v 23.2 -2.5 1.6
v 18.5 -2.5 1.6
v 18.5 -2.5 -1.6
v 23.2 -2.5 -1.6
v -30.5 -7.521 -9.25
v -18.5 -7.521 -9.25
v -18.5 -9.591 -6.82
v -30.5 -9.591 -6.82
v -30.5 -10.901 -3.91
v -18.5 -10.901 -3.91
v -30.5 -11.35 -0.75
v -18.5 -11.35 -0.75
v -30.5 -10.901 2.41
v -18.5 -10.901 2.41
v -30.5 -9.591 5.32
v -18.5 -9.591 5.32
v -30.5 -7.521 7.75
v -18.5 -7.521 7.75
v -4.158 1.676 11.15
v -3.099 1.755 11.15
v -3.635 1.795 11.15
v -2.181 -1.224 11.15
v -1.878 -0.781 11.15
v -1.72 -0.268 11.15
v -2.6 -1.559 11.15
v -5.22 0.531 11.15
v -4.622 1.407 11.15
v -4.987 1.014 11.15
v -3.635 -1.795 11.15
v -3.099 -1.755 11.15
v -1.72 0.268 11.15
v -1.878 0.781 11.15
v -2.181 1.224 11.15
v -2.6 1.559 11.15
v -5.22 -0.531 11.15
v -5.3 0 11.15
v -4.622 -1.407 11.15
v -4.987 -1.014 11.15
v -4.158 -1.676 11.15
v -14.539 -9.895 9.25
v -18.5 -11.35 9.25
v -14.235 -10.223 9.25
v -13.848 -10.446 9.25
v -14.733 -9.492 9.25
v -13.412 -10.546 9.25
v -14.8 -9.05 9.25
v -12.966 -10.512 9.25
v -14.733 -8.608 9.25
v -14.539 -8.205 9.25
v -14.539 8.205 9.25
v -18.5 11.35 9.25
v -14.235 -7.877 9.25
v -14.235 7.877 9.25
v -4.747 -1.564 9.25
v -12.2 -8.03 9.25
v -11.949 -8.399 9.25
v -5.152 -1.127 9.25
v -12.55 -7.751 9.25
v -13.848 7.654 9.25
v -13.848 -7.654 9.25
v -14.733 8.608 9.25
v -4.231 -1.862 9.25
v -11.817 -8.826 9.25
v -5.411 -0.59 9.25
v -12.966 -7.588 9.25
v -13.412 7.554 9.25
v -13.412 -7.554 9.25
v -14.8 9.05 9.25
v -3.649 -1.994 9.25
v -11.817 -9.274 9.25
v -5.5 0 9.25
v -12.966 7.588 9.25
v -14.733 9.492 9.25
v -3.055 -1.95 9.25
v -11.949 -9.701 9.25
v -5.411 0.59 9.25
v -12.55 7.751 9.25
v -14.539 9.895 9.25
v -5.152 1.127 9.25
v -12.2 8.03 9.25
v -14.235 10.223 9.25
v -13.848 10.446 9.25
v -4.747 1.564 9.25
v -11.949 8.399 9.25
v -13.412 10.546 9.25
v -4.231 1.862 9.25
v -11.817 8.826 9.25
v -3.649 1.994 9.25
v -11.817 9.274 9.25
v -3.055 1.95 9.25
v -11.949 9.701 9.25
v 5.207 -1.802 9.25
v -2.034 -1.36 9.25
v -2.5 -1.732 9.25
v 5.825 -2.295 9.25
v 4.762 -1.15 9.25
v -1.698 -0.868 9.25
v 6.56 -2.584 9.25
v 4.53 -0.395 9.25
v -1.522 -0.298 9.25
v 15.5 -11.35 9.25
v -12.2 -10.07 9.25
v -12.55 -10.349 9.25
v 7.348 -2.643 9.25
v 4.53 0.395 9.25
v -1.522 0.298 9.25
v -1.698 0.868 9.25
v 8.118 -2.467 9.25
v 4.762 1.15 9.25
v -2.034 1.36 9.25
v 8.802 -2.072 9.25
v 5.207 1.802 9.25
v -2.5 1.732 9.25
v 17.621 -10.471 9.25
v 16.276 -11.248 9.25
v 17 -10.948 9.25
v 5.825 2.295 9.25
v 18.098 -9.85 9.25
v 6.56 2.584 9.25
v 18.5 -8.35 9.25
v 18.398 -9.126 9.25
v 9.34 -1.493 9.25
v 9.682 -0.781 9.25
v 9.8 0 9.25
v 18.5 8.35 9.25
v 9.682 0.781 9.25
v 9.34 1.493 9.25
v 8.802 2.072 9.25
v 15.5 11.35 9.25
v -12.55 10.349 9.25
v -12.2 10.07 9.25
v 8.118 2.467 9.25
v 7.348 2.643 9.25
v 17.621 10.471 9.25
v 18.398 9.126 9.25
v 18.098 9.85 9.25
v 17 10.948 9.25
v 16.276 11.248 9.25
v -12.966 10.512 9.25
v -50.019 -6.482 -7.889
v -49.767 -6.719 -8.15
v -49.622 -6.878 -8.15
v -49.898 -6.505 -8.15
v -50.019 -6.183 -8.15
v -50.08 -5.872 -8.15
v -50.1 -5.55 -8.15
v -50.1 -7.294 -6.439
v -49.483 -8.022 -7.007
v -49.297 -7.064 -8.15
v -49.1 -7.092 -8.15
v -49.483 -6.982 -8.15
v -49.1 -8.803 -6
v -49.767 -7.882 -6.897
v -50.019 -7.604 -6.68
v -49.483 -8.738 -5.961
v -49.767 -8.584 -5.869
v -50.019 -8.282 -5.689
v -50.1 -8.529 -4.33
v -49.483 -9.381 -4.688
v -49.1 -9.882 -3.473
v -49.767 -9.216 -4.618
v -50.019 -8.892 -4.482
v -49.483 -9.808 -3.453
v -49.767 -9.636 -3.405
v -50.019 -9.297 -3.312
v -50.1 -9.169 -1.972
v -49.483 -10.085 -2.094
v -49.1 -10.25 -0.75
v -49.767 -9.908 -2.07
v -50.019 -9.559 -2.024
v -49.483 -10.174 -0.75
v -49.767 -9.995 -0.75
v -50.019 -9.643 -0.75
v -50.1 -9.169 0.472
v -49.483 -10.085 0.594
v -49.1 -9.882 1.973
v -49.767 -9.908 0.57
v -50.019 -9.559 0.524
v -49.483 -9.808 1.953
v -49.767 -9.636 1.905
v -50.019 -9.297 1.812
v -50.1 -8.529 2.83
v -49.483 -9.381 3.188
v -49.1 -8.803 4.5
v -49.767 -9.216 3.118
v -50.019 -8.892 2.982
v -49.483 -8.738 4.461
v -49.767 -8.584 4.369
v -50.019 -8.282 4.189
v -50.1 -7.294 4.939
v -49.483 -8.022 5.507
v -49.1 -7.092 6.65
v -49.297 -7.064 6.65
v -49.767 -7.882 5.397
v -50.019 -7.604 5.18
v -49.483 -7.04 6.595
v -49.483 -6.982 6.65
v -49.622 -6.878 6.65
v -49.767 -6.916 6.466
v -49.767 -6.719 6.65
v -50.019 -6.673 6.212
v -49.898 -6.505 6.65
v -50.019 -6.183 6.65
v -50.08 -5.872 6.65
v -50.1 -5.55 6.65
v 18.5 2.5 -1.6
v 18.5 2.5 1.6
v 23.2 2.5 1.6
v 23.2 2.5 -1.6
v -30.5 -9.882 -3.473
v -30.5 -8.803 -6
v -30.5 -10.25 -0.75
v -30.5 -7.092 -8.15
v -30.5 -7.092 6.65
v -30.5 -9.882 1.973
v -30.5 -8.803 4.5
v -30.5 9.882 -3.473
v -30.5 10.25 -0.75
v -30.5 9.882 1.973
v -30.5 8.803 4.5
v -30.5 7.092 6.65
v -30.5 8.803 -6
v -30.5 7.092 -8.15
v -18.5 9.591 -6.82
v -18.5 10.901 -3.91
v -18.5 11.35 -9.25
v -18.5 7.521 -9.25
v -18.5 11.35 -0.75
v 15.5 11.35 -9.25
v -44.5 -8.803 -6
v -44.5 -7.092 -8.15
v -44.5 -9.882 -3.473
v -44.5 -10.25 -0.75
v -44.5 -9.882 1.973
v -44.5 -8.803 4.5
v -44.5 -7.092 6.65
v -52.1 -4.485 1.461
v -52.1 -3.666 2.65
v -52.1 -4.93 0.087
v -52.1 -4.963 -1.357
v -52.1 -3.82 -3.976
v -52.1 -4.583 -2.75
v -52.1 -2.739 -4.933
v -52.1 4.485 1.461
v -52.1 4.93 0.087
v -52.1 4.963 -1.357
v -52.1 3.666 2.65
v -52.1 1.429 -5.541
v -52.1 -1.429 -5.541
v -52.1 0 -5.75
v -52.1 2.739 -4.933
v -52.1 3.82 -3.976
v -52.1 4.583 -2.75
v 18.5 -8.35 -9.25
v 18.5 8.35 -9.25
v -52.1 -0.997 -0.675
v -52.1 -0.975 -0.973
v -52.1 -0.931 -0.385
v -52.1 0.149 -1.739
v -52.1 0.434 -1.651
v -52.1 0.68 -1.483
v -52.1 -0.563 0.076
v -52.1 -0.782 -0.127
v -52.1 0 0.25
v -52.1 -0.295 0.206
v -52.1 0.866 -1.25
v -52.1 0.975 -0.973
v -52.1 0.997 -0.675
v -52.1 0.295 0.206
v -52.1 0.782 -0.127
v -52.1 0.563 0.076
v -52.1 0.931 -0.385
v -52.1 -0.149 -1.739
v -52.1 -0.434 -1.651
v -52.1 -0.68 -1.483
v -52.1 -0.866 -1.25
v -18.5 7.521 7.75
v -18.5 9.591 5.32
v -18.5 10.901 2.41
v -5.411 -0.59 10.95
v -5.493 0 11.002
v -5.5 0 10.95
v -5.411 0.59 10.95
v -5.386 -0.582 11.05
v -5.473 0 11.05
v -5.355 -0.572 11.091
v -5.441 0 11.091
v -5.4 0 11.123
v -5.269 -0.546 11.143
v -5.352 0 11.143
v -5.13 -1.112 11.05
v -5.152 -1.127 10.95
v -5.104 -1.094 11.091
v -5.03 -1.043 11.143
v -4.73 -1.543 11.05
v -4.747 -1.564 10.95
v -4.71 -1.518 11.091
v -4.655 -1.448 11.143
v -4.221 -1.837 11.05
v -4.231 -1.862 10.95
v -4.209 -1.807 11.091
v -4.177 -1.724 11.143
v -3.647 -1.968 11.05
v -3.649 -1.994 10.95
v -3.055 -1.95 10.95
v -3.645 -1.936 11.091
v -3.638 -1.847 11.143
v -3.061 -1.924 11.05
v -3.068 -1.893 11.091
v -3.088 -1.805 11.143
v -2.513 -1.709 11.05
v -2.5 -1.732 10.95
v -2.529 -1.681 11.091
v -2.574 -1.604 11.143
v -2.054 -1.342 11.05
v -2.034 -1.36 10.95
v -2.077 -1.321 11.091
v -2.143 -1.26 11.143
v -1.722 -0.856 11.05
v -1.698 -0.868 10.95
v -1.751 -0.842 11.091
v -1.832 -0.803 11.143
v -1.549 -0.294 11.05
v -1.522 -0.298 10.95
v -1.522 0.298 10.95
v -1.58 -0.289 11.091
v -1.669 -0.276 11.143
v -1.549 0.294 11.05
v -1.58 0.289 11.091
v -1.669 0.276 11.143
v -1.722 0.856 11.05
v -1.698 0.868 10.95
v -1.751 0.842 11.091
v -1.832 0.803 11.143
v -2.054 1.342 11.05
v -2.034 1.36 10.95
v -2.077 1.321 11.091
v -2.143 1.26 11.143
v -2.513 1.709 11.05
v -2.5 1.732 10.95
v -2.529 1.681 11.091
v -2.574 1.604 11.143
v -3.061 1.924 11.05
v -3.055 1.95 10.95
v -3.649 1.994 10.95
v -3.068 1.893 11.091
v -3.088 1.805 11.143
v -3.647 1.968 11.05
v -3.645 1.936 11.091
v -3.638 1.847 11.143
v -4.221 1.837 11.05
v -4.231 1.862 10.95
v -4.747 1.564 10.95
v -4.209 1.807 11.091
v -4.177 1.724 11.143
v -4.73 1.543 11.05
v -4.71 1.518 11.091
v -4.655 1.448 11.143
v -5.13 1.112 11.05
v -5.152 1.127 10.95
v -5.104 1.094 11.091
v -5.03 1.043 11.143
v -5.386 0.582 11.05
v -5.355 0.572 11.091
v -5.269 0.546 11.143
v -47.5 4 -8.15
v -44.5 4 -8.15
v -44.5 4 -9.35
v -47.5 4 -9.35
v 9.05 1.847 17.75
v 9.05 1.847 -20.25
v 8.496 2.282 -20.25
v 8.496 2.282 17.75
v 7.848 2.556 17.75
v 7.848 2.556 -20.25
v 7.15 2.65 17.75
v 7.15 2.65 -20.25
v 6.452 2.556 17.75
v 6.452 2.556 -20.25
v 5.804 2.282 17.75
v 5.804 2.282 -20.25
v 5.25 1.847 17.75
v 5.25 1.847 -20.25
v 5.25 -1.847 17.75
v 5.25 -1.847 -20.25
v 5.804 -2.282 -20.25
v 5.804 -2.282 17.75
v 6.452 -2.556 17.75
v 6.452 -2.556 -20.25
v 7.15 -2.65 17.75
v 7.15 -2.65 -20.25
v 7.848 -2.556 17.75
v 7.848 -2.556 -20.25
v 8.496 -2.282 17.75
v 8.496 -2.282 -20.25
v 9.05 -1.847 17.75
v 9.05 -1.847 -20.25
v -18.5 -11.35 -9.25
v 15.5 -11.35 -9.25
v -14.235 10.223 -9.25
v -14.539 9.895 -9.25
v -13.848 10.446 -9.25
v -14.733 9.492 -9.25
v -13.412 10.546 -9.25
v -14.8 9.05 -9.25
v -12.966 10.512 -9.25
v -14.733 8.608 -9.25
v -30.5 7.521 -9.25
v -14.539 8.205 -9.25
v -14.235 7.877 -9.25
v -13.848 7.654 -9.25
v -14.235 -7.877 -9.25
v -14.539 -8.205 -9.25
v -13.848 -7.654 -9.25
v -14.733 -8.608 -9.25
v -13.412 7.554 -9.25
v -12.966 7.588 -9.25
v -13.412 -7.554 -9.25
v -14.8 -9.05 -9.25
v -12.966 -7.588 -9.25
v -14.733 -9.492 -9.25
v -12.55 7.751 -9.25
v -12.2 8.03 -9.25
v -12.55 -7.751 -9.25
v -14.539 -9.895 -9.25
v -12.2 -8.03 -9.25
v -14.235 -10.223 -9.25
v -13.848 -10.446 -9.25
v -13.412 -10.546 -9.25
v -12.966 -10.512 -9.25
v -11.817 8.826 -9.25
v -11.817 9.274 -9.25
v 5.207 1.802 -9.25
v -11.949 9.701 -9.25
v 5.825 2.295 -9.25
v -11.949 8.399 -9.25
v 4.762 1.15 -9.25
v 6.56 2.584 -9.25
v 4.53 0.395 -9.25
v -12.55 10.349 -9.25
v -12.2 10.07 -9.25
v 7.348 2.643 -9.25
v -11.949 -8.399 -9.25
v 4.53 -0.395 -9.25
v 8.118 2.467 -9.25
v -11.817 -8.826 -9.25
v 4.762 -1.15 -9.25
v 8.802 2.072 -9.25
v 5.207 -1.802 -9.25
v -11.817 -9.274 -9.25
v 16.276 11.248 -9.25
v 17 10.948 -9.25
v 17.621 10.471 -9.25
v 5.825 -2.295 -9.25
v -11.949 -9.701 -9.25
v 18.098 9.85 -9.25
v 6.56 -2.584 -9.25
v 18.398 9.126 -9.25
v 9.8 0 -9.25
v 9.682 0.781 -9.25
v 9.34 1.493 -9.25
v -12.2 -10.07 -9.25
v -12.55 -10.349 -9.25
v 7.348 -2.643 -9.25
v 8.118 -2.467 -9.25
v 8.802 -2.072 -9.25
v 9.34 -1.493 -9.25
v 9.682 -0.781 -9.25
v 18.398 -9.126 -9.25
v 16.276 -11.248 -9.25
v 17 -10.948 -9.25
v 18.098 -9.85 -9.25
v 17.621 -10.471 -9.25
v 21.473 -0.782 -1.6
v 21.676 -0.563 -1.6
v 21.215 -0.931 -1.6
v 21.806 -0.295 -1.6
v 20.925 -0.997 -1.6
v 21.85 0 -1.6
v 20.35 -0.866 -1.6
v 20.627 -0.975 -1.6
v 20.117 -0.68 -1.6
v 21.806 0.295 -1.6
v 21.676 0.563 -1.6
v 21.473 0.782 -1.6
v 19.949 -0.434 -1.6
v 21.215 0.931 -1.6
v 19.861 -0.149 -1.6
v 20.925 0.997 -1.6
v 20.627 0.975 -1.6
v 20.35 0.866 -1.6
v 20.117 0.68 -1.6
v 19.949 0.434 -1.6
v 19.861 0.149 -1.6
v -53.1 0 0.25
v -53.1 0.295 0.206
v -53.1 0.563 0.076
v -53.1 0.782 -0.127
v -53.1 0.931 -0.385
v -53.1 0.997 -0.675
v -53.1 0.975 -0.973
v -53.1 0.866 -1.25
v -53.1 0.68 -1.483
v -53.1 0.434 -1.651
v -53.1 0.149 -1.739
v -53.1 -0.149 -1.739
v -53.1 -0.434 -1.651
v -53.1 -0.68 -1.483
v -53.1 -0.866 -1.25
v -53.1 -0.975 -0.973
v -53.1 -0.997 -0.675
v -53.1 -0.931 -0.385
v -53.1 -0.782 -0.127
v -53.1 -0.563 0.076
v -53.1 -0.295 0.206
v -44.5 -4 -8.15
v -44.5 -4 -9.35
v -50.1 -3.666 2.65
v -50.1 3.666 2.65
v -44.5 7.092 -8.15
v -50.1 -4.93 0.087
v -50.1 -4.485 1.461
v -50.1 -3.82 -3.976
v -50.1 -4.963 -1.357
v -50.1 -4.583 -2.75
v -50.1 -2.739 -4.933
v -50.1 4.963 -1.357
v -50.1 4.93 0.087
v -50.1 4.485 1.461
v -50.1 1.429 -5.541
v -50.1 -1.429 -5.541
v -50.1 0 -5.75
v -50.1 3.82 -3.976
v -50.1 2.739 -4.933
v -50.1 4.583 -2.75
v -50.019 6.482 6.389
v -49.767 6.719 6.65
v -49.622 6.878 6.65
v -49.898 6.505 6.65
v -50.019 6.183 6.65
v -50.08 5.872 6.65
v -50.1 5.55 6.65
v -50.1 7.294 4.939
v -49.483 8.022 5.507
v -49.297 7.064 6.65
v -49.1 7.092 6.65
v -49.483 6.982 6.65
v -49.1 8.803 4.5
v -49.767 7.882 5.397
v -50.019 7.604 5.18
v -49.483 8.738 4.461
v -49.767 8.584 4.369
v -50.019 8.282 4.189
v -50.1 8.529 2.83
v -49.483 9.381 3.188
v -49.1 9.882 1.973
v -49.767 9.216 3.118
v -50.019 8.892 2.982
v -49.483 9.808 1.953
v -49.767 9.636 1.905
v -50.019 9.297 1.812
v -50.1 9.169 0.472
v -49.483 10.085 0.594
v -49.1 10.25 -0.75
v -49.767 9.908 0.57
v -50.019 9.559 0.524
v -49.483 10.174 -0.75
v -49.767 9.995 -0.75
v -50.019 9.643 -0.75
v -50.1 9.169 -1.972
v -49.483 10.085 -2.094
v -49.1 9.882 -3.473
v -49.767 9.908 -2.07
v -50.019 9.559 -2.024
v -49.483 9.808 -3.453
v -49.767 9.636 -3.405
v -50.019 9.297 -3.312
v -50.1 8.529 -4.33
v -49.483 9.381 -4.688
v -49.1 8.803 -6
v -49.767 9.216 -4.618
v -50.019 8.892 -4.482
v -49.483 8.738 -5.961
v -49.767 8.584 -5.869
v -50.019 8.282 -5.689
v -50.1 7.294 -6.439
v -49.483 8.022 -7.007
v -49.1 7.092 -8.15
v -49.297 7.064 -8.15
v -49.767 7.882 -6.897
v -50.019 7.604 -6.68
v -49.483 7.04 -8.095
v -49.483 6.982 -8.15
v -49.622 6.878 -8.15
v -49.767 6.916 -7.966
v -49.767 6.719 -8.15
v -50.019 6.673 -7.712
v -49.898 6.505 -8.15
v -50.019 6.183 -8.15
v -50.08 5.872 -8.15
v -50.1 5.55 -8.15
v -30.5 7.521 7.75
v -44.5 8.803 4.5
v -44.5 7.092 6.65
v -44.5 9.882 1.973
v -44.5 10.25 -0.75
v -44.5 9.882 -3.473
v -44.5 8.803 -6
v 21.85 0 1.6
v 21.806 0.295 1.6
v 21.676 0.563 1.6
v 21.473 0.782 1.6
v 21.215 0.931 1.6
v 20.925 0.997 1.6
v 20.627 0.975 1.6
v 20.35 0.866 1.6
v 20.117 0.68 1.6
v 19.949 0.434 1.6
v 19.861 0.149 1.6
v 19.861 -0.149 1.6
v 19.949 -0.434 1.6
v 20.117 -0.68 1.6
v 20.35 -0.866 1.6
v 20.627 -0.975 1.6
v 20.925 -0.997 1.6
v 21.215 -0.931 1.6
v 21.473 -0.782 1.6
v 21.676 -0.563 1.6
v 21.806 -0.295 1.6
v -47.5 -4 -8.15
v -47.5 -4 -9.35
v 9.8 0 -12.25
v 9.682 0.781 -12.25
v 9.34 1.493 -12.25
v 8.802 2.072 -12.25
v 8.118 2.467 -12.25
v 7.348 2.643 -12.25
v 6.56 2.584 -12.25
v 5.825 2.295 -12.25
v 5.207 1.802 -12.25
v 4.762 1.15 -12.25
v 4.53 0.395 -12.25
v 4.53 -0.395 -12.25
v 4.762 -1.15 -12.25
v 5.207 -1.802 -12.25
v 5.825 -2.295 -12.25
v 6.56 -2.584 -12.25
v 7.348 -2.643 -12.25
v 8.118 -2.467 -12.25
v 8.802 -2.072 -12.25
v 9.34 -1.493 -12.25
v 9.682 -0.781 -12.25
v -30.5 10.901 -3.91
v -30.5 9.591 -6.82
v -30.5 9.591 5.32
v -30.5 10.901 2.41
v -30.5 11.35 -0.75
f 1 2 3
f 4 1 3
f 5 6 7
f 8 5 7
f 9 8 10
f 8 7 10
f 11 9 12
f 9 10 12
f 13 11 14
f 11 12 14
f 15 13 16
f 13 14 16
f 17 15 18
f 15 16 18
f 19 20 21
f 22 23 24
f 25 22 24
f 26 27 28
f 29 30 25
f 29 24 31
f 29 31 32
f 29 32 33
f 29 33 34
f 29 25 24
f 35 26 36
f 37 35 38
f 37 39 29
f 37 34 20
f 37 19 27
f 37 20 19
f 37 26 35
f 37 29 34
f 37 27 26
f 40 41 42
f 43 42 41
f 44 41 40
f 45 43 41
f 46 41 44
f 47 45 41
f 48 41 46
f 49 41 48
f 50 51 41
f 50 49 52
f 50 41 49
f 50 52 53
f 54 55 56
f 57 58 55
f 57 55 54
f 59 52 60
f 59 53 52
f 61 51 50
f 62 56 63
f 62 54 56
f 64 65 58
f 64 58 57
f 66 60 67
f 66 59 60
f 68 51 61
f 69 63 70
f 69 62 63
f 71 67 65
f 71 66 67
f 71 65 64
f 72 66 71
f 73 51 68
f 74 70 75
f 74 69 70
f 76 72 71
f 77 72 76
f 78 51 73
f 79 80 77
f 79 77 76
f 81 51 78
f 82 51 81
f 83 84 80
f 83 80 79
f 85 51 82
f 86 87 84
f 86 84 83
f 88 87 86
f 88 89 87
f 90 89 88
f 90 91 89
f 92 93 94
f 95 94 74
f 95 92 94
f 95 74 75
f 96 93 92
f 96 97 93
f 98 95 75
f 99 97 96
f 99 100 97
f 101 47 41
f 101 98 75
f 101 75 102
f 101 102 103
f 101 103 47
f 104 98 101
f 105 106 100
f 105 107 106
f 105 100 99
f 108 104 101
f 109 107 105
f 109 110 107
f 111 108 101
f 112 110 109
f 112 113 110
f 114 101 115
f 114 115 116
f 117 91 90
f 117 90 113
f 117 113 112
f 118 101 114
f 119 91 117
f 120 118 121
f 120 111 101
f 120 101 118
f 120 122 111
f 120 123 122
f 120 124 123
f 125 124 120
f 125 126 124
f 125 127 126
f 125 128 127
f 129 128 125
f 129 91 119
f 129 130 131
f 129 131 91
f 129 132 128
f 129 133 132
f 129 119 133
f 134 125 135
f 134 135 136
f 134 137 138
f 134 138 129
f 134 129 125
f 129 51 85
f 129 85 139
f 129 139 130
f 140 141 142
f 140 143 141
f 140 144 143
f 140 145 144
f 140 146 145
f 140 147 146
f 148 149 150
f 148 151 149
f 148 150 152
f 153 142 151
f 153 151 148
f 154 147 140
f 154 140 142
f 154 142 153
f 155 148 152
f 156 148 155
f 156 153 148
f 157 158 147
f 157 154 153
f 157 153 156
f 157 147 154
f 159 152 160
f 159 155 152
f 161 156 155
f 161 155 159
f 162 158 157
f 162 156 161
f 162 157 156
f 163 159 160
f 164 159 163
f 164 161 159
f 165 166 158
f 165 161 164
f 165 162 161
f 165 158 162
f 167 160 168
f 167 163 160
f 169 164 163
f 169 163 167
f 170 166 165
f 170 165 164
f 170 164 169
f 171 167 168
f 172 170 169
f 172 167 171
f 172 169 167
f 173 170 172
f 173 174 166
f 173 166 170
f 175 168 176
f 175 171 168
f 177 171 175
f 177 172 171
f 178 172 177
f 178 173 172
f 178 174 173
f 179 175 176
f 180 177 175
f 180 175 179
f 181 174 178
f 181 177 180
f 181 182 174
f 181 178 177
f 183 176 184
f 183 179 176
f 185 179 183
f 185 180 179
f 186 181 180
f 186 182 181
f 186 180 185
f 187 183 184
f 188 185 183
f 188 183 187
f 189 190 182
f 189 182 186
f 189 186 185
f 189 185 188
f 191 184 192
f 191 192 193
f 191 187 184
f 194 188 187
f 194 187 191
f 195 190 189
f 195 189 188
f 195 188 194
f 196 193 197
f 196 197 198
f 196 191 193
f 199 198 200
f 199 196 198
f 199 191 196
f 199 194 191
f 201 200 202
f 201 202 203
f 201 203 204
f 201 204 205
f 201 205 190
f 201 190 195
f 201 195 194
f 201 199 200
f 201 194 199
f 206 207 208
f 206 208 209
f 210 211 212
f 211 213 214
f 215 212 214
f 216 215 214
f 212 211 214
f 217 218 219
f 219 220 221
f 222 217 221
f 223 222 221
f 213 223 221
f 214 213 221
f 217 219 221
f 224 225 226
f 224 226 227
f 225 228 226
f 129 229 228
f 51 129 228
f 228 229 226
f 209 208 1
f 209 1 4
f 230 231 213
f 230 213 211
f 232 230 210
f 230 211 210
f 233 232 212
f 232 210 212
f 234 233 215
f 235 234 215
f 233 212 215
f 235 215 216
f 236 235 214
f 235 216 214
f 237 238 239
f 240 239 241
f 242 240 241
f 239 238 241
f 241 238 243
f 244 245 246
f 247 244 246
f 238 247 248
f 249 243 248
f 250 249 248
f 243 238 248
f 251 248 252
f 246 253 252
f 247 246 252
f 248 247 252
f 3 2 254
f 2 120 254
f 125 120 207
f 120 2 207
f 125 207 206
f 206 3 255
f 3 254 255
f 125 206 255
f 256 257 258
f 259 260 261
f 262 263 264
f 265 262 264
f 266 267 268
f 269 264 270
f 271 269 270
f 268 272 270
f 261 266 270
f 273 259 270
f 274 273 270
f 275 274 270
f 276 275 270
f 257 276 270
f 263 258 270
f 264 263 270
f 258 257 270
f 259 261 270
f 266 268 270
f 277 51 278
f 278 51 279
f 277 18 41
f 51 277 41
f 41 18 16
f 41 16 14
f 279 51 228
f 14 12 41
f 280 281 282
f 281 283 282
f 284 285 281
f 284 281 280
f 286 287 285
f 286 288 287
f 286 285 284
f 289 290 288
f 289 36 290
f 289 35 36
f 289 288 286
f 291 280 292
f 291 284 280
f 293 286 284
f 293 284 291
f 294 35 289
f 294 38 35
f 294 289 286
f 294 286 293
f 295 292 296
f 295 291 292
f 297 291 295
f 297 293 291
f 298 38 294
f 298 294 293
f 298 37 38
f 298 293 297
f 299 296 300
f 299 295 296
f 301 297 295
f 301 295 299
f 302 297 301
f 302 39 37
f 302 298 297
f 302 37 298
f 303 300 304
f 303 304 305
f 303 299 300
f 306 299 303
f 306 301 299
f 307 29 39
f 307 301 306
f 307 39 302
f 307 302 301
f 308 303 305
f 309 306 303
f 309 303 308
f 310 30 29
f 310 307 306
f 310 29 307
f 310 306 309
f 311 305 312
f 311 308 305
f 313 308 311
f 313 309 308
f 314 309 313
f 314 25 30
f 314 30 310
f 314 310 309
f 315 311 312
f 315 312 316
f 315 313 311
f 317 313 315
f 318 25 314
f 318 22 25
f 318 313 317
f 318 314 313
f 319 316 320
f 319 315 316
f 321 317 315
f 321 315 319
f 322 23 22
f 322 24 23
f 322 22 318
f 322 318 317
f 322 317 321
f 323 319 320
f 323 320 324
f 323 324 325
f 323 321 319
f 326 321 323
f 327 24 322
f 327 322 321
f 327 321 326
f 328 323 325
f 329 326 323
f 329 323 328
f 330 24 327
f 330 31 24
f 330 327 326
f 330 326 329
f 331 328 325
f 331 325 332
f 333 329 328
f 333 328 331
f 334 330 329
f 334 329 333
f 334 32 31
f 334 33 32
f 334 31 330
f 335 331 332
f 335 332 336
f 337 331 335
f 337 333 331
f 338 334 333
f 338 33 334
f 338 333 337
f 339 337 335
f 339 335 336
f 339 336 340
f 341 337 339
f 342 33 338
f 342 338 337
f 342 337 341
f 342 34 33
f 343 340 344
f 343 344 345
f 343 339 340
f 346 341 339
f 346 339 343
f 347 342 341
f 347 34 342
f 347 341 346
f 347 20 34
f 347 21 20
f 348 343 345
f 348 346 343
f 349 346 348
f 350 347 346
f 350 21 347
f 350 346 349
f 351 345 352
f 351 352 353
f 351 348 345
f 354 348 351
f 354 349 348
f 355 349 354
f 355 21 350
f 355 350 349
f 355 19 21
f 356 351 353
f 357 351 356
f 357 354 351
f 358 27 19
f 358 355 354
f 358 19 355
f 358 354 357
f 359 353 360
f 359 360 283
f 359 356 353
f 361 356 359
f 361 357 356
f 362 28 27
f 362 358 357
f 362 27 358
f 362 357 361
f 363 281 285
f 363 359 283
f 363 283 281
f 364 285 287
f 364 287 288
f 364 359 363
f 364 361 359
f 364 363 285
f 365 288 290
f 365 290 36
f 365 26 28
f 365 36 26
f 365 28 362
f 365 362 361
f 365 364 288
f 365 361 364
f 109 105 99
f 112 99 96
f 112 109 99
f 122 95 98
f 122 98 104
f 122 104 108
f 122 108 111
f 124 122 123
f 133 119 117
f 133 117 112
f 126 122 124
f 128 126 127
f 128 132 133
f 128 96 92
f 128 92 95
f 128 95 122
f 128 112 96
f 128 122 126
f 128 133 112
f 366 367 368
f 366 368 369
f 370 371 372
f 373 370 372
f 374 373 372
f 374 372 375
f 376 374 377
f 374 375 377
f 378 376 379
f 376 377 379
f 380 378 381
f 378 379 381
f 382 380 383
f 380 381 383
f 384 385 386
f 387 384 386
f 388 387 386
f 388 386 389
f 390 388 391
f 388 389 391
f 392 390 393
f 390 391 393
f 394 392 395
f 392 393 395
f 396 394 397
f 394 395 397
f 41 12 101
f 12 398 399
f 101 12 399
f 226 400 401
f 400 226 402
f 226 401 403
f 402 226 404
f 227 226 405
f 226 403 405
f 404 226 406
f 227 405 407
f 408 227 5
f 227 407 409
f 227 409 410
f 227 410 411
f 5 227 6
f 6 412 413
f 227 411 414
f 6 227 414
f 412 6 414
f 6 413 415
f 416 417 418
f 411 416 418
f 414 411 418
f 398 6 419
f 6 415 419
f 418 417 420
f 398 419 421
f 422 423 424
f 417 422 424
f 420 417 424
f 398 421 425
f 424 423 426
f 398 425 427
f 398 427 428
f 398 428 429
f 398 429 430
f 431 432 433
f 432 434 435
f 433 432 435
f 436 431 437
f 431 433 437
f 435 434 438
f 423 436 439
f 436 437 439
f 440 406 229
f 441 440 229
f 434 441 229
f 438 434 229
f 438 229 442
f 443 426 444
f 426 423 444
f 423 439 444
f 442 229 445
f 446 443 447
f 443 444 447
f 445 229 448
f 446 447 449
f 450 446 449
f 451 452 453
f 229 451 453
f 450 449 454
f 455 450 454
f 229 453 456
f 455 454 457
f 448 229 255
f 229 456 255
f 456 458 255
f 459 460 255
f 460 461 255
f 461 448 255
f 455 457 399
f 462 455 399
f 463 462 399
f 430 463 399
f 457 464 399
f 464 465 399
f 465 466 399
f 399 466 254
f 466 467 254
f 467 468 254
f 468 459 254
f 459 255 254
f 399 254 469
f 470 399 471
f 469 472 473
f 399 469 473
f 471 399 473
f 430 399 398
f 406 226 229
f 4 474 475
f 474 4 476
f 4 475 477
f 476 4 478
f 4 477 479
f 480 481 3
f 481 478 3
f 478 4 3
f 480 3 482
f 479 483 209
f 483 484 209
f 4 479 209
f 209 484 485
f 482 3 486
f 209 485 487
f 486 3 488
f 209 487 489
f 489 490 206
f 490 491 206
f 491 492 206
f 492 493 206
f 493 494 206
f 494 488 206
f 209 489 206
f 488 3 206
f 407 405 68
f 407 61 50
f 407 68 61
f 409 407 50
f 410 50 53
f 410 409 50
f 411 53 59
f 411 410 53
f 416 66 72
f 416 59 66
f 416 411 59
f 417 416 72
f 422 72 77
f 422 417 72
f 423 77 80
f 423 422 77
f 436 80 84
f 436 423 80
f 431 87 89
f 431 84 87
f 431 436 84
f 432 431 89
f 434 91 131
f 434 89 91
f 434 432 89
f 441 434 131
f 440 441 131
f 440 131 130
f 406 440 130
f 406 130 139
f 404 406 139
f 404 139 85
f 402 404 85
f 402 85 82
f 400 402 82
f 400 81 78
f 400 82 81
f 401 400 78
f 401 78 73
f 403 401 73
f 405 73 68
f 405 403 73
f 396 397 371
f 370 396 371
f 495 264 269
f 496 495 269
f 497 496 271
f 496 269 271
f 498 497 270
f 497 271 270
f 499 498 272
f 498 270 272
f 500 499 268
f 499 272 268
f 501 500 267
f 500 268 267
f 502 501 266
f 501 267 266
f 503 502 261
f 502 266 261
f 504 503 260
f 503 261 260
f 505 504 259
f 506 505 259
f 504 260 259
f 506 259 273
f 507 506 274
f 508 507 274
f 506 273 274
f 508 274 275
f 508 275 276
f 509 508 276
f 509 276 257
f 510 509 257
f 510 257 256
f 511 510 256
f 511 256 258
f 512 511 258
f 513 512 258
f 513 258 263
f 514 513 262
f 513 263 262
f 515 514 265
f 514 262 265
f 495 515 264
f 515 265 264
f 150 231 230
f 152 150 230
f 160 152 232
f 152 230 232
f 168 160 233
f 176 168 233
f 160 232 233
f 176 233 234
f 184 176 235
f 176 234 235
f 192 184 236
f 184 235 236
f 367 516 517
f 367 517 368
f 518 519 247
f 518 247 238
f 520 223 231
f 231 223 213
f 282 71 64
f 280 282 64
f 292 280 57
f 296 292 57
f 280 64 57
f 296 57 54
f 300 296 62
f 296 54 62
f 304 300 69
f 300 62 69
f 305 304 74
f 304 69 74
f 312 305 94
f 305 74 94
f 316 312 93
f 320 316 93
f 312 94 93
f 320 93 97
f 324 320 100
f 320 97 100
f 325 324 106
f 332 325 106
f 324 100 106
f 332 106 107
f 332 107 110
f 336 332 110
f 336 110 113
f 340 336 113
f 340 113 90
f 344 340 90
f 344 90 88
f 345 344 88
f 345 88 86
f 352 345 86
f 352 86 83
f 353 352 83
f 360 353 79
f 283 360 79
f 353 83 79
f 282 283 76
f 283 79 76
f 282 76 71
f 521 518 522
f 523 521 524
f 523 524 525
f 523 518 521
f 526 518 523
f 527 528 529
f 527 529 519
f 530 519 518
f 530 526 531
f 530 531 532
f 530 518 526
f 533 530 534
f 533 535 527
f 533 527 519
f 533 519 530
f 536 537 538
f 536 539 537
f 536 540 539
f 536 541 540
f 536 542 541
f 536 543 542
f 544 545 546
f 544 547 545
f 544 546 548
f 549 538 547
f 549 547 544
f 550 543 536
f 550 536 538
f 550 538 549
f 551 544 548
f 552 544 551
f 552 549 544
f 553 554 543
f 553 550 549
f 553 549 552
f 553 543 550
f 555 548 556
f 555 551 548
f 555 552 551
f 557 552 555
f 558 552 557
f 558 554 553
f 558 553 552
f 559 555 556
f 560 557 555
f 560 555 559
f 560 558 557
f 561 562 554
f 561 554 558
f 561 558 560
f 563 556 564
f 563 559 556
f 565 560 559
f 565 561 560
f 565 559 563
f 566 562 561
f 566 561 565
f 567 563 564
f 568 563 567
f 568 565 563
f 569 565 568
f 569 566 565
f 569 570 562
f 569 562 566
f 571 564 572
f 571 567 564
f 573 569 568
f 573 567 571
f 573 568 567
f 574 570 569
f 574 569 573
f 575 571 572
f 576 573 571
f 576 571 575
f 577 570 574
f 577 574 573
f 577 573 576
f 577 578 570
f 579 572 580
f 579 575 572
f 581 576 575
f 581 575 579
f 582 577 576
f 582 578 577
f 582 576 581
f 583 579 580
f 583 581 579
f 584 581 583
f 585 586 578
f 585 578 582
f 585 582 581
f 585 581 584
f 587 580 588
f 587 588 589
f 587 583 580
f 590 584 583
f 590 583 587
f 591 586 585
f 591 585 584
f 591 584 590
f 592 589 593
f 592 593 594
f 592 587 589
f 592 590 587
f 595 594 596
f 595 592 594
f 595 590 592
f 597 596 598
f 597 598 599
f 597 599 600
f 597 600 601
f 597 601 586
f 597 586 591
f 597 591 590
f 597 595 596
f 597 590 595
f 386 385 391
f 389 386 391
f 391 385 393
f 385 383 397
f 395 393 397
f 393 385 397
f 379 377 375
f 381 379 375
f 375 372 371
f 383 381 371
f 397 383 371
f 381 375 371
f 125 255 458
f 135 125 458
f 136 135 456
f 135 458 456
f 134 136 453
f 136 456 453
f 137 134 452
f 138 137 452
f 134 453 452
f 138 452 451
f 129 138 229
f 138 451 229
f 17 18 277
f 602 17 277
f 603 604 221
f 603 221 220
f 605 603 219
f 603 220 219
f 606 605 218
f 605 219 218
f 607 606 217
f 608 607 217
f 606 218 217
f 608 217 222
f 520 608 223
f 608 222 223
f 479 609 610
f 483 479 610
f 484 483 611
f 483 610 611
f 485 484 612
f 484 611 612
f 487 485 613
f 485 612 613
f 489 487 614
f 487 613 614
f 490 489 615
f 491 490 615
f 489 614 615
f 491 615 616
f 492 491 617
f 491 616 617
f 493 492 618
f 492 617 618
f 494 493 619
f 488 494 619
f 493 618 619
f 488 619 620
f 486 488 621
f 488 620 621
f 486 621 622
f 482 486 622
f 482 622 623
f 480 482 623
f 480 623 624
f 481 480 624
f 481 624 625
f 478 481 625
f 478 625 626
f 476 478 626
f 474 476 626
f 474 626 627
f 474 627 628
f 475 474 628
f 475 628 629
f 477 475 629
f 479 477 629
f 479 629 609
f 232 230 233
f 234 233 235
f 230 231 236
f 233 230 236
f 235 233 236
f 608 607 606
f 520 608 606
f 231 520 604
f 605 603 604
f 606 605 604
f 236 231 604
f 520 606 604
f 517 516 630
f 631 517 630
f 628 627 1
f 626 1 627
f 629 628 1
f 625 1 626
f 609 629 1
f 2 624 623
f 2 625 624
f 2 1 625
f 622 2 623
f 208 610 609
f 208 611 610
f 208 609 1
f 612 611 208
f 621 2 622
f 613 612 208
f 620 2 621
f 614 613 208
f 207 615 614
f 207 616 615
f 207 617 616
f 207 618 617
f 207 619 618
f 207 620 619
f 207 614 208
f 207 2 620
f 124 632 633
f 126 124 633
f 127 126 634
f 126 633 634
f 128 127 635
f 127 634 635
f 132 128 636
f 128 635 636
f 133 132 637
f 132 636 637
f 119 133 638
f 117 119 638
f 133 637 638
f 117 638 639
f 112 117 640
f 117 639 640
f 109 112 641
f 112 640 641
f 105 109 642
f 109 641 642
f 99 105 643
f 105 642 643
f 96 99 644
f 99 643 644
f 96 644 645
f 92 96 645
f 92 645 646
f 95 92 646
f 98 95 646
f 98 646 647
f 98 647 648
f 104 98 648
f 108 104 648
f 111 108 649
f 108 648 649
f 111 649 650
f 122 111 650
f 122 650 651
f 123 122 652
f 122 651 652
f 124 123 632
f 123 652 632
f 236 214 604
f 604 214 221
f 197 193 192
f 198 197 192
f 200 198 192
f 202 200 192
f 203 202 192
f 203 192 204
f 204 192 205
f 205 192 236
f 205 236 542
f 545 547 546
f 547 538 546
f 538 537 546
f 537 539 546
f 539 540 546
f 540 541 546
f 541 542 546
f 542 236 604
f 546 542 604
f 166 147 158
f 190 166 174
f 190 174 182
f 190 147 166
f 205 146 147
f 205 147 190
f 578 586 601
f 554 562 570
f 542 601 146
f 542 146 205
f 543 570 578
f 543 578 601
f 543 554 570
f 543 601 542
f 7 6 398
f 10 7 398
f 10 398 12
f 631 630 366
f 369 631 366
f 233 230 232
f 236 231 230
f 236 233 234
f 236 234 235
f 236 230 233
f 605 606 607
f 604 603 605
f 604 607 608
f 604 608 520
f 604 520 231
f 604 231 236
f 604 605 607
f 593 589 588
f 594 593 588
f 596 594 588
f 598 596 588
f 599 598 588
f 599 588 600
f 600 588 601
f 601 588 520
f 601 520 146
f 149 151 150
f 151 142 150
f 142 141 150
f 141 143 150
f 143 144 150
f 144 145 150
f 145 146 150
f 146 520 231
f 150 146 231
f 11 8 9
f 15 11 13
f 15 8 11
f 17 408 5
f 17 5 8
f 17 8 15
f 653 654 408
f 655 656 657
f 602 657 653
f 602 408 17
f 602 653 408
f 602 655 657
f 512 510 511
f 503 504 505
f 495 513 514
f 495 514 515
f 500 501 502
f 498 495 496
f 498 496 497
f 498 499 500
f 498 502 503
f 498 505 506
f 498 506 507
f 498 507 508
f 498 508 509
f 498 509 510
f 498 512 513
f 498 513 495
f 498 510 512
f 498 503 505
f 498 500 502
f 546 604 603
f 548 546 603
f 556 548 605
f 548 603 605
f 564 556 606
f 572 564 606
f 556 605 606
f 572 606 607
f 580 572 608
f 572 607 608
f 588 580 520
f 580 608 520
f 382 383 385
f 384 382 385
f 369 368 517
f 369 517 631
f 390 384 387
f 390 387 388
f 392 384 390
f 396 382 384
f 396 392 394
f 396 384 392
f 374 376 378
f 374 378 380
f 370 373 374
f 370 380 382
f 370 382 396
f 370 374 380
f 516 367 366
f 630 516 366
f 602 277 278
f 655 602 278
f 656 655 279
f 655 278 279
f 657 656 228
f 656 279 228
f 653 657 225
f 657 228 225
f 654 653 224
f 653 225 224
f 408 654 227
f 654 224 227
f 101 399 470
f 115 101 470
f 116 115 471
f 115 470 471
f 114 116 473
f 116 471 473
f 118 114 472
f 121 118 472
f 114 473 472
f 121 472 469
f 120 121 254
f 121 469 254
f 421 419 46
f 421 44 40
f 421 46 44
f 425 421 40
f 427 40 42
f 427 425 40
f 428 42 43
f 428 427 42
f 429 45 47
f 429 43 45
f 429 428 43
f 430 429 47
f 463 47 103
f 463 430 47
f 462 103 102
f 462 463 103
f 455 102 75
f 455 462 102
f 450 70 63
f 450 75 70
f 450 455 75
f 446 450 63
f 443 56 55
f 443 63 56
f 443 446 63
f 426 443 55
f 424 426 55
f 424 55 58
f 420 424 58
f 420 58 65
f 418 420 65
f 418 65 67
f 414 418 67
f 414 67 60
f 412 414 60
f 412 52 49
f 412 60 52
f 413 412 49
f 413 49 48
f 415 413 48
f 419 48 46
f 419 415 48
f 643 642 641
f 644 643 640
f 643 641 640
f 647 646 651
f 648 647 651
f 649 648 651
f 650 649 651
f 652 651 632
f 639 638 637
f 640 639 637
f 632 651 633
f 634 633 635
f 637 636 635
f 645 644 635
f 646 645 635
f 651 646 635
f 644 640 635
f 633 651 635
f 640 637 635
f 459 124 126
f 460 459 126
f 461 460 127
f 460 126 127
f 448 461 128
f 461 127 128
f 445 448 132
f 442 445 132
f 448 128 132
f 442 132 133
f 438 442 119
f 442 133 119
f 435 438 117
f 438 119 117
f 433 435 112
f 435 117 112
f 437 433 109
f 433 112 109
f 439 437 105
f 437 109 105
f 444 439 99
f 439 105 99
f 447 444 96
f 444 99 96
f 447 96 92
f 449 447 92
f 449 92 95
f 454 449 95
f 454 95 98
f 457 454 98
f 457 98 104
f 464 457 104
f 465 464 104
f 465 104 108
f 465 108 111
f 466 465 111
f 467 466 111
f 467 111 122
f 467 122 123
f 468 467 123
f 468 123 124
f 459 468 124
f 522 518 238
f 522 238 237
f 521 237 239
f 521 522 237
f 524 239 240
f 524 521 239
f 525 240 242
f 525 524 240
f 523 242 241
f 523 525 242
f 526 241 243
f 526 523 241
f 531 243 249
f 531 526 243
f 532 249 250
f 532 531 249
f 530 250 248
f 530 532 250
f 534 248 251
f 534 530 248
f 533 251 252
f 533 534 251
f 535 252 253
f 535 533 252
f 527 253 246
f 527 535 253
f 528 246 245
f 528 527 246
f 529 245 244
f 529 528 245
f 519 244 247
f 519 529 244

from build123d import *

# Parameters (mm, degrees)
SALIENTE_EXTRUIR1_DEPTH       = 9.25
SALIENTE_EXTRUIR1_DEPTH_BACK  = 9.25
SALIENTE_EXTRUIR2_DEPTH       = 12
CROQUIS3_W                    = 3.2
CROQUIS3_H                    = 5
SALIENTE_EXTRUIR3_DEPTH       = 4.7
CORTAR_EXTRUIR1_DEPTH         = 28
CORTAR_EXTRUIR1_DEPTH_BACK    = 17.7
CROQUIS4_R                    = 1.5
CROQUIS5_R                    = 2
SALIENTE_EXTRUIR4_DEPTH       = 1.9
REDONDEO1_R                   = 0.2
CROQUIS6_R                    = 2.65
CORTAR_EXTRUIR2_DEPTH         = 23.9
SALIENTE_EXTRUIR5_DEPTH       = 14
SALIENTE_EXTRUIR6_DEPTH       = 5.6
REDONDEO2_R                   = 1
SALIENTE_EXTRUIR7_DEPTH       = 2
CROQUIS12_R                   = 1
SALIENTE_EXTRUIR8_DEPTH       = 1
CROQUIS13_W                   = 3
CROQUIS13_H                   = 8
SALIENTE_EXTRUIR9_DEPTH       = 1.2
CROQUIS14_R                   = 1
CORTAR_EXTRUIR3_DEPTH         = 4.2
SALIENTE_EXTRUIR10_DEPTH      = 17.75
SALIENTE_EXTRUIR10_DEPTH_BACK = 20.25
SALIENTE_EXTRUIR11_DEPTH      = 9.25
SALIENTE_EXTRUIR11_DEPTH_BACK = 12.25
CROQUIS16_R                   = 2.65


with BuildPart() as part:
    # Croquis1 → Saliente-Extruir1 (new, two sides: drawn at the far end of the back side and taken through both)
    with BuildSketch(Plane.XY.offset(-SALIENTE_EXTRUIR1_DEPTH_BACK)):
        with BuildLine():
            Line((-18.5, -11.35), (15.5, -11.35))
            ThreePointArc((15.5, -11.35), (17.621320344, -10.471320344), (18.5, -8.35))
            Line((18.5, -8.35), (18.5, 8.35))
            ThreePointArc((18.5, 8.35), (17.621320344, 10.471320344), (15.5, 11.35))
            Line((15.5, 11.35), (-18.5, 11.35))
            Line((-18.5, 11.35), (-18.5, -11.35))
        make_face()
    extrude(amount=SALIENTE_EXTRUIR1_DEPTH + SALIENTE_EXTRUIR1_DEPTH_BACK)

    # Croquis2 → Saliente-Extruir2 (add)
    with BuildSketch(Plane.ZY.offset(18.5)):
        with BuildLine():
            Line((7.75, -7.521469271), (7.75, 7.521469271))
            ThreePointArc((7.75, 7.521469271), (-0.75, 11.35), (-9.25, 7.521469271))
            Line((-9.25, 7.521469271), (-9.25, -7.521469271))
            ThreePointArc((-9.25, -7.521469271), (-0.75, -11.35), (7.75, -7.521469271))
        make_face()
    extrude(amount=SALIENTE_EXTRUIR2_DEPTH)

    # Croquis3 → Saliente-Extruir3 (add)
    with BuildSketch(Plane(origin=(18.5, 0, 0), x_dir=(0, 0, -1), z_dir=(1, 0, 0))):
        Rectangle(CROQUIS3_W, CROQUIS3_H)
    extrude(amount=SALIENTE_EXTRUIR3_DEPTH)

    # Croquis4 → Cortar-Extruir1 (cut, two sides: drawn at the far end of the back side and taken through both)
    with BuildSketch(Plane.XY.offset(-CORTAR_EXTRUIR1_DEPTH_BACK)):
        with Locations(Location((-13.3, 9.05, 0), (0, 0, 180))):
            Circle(CROQUIS4_R)
        with Locations(Location((-13.3, -9.05, 0), (0, 0, 180))):
            Circle(CROQUIS4_R)
    extrude(amount=CORTAR_EXTRUIR1_DEPTH + CORTAR_EXTRUIR1_DEPTH_BACK, mode=Mode.SUBTRACT)

    # Croquis5 → Saliente-Extruir4 (add)
    with BuildSketch(Plane.XY.offset(9.25)):
        with Locations(Location((-3.5, 0, 0), (0, 0, 180))):
            Circle(CROQUIS5_R)
    extrude(amount=SALIENTE_EXTRUIR4_DEPTH)

    # Redondeo1
    redondeo1_edges = [part.edges().sort_by_distance(p)[0] for p in [
        (-1.5, 0, 11.15),
    ]]
    fillet(redondeo1_edges, radius=REDONDEO1_R)

    # Croquis6 → Cortar-Extruir2 (cut)
    with BuildSketch(Plane.XY.offset(9.25)):
        with Locations((7.15, 0)):
            Circle(CROQUIS6_R)
    extrude(amount=-CORTAR_EXTRUIR2_DEPTH, mode=Mode.SUBTRACT)

    # Croquis14 → Cortar-Extruir3 (cut)
    with BuildSketch(Plane.XY.offset(1.6)):
        with Locations((20.85, 0)):
            Circle(CROQUIS14_R)
    extrude(amount=-CORTAR_EXTRUIR3_DEPTH, mode=Mode.SUBTRACT)


with BuildPart() as body_2:
    # Croquis9 → Saliente-Extruir5 (new body)
    with BuildSketch(Plane.ZY.offset(30.5)):
        with BuildLine():
            Line((6.65, -7.092425537), (6.65, 7.092425537))
            ThreePointArc((6.65, 7.092425537), (-0.75, 10.25), (-8.15, 7.092425537))
            Line((-8.15, 7.092425537), (-8.15, -7.092425537))
            ThreePointArc((-8.15, -7.092425537), (-0.75, -10.25), (6.65, -7.092425537))
        make_face()
    extrude(amount=SALIENTE_EXTRUIR5_DEPTH)


with BuildPart() as body_3:
    # Croquis10 → Saliente-Extruir6 (new body)
    with BuildSketch(Plane.ZY.offset(44.5)):
        with BuildLine():
            Line((-8.15, 7.092425537), (-8.15, -7.092425537))
            ThreePointArc((-8.15, -7.092425537), (-0.75, -10.25), (6.65, -7.092425537))
            Line((6.65, -7.092425537), (6.65, 7.092425537))
            ThreePointArc((6.65, 7.092425537), (-0.75, 10.25), (-8.15, 7.092425537))
        make_face()
    extrude(amount=SALIENTE_EXTRUIR6_DEPTH)

    # Redondeo2
    redondeo2_edges = [body_3.edges().sort_by_distance(p)[0] for p in [
        (-50.1, -10.25, -0.75),
        (-50.1, 10.25, -0.75),
    ]]
    fillet(redondeo2_edges, radius=REDONDEO2_R)


with BuildPart() as body_4:
    # Croquis11 → Saliente-Extruir7 (new body)
    with BuildSketch(Plane.ZY.offset(50.1)):
        with BuildLine():
            Line((2.65, 3.666060556), (2.65, -3.666060556))
            ThreePointArc((2.65, -3.666060556), (-5.75, 0), (2.65, 3.666060556))
        make_face()
    extrude(amount=SALIENTE_EXTRUIR7_DEPTH)


with BuildPart() as body_5:
    # Croquis12 → Saliente-Extruir8 (new body)
    with BuildSketch(Plane.ZY.offset(52.1)):
        with Locations((-0.75, 0)):
            Circle(CROQUIS12_R)
    extrude(amount=SALIENTE_EXTRUIR8_DEPTH)


with BuildPart() as body_6:
    # Croquis13 → Saliente-Extruir9 (new body)
    with BuildSketch(Plane(origin=(0, 0, -8.15), x_dir=(-1, 0, 0), z_dir=(0, 0, -1))):
        with Locations((46, 0)):
            Rectangle(CROQUIS13_W, CROQUIS13_H)
    extrude(amount=SALIENTE_EXTRUIR9_DEPTH)


with BuildPart() as body_7:
    # Croquis15 → Saliente-Extruir10 (new, two sides: drawn at the far end of the back side and taken through both)
    with BuildSketch(Plane.XY.offset(-SALIENTE_EXTRUIR10_DEPTH_BACK)):
        with BuildLine():
            Line((9.05, -1.84729532), (9.05, 1.84729532))
            ThreePointArc((9.05, 1.84729532), (7.15, 2.65), (5.25, 1.84729532))
            Line((5.25, 1.84729532), (5.25, -1.84729532))
            ThreePointArc((5.25, -1.84729532), (7.15, -2.65), (9.05, -1.84729532))
        make_face()
    extrude(amount=SALIENTE_EXTRUIR10_DEPTH + SALIENTE_EXTRUIR10_DEPTH_BACK)


with BuildPart() as body_8:
    # Croquis16 → Saliente-Extruir11 (new, two sides: drawn at the far end of the back side and taken through both)
    with BuildSketch(Plane.XY.offset(-SALIENTE_EXTRUIR11_DEPTH_BACK)):
        with Locations((7.15, 0)):
            Circle(CROQUIS16_R)
    extrude(amount=SALIENTE_EXTRUIR11_DEPTH + SALIENTE_EXTRUIR11_DEPTH_BACK)


solid = Compound([part.part, body_2.part, body_3.part, body_4.part, body_5.part, body_6.part, body_7.part, body_8.part])
